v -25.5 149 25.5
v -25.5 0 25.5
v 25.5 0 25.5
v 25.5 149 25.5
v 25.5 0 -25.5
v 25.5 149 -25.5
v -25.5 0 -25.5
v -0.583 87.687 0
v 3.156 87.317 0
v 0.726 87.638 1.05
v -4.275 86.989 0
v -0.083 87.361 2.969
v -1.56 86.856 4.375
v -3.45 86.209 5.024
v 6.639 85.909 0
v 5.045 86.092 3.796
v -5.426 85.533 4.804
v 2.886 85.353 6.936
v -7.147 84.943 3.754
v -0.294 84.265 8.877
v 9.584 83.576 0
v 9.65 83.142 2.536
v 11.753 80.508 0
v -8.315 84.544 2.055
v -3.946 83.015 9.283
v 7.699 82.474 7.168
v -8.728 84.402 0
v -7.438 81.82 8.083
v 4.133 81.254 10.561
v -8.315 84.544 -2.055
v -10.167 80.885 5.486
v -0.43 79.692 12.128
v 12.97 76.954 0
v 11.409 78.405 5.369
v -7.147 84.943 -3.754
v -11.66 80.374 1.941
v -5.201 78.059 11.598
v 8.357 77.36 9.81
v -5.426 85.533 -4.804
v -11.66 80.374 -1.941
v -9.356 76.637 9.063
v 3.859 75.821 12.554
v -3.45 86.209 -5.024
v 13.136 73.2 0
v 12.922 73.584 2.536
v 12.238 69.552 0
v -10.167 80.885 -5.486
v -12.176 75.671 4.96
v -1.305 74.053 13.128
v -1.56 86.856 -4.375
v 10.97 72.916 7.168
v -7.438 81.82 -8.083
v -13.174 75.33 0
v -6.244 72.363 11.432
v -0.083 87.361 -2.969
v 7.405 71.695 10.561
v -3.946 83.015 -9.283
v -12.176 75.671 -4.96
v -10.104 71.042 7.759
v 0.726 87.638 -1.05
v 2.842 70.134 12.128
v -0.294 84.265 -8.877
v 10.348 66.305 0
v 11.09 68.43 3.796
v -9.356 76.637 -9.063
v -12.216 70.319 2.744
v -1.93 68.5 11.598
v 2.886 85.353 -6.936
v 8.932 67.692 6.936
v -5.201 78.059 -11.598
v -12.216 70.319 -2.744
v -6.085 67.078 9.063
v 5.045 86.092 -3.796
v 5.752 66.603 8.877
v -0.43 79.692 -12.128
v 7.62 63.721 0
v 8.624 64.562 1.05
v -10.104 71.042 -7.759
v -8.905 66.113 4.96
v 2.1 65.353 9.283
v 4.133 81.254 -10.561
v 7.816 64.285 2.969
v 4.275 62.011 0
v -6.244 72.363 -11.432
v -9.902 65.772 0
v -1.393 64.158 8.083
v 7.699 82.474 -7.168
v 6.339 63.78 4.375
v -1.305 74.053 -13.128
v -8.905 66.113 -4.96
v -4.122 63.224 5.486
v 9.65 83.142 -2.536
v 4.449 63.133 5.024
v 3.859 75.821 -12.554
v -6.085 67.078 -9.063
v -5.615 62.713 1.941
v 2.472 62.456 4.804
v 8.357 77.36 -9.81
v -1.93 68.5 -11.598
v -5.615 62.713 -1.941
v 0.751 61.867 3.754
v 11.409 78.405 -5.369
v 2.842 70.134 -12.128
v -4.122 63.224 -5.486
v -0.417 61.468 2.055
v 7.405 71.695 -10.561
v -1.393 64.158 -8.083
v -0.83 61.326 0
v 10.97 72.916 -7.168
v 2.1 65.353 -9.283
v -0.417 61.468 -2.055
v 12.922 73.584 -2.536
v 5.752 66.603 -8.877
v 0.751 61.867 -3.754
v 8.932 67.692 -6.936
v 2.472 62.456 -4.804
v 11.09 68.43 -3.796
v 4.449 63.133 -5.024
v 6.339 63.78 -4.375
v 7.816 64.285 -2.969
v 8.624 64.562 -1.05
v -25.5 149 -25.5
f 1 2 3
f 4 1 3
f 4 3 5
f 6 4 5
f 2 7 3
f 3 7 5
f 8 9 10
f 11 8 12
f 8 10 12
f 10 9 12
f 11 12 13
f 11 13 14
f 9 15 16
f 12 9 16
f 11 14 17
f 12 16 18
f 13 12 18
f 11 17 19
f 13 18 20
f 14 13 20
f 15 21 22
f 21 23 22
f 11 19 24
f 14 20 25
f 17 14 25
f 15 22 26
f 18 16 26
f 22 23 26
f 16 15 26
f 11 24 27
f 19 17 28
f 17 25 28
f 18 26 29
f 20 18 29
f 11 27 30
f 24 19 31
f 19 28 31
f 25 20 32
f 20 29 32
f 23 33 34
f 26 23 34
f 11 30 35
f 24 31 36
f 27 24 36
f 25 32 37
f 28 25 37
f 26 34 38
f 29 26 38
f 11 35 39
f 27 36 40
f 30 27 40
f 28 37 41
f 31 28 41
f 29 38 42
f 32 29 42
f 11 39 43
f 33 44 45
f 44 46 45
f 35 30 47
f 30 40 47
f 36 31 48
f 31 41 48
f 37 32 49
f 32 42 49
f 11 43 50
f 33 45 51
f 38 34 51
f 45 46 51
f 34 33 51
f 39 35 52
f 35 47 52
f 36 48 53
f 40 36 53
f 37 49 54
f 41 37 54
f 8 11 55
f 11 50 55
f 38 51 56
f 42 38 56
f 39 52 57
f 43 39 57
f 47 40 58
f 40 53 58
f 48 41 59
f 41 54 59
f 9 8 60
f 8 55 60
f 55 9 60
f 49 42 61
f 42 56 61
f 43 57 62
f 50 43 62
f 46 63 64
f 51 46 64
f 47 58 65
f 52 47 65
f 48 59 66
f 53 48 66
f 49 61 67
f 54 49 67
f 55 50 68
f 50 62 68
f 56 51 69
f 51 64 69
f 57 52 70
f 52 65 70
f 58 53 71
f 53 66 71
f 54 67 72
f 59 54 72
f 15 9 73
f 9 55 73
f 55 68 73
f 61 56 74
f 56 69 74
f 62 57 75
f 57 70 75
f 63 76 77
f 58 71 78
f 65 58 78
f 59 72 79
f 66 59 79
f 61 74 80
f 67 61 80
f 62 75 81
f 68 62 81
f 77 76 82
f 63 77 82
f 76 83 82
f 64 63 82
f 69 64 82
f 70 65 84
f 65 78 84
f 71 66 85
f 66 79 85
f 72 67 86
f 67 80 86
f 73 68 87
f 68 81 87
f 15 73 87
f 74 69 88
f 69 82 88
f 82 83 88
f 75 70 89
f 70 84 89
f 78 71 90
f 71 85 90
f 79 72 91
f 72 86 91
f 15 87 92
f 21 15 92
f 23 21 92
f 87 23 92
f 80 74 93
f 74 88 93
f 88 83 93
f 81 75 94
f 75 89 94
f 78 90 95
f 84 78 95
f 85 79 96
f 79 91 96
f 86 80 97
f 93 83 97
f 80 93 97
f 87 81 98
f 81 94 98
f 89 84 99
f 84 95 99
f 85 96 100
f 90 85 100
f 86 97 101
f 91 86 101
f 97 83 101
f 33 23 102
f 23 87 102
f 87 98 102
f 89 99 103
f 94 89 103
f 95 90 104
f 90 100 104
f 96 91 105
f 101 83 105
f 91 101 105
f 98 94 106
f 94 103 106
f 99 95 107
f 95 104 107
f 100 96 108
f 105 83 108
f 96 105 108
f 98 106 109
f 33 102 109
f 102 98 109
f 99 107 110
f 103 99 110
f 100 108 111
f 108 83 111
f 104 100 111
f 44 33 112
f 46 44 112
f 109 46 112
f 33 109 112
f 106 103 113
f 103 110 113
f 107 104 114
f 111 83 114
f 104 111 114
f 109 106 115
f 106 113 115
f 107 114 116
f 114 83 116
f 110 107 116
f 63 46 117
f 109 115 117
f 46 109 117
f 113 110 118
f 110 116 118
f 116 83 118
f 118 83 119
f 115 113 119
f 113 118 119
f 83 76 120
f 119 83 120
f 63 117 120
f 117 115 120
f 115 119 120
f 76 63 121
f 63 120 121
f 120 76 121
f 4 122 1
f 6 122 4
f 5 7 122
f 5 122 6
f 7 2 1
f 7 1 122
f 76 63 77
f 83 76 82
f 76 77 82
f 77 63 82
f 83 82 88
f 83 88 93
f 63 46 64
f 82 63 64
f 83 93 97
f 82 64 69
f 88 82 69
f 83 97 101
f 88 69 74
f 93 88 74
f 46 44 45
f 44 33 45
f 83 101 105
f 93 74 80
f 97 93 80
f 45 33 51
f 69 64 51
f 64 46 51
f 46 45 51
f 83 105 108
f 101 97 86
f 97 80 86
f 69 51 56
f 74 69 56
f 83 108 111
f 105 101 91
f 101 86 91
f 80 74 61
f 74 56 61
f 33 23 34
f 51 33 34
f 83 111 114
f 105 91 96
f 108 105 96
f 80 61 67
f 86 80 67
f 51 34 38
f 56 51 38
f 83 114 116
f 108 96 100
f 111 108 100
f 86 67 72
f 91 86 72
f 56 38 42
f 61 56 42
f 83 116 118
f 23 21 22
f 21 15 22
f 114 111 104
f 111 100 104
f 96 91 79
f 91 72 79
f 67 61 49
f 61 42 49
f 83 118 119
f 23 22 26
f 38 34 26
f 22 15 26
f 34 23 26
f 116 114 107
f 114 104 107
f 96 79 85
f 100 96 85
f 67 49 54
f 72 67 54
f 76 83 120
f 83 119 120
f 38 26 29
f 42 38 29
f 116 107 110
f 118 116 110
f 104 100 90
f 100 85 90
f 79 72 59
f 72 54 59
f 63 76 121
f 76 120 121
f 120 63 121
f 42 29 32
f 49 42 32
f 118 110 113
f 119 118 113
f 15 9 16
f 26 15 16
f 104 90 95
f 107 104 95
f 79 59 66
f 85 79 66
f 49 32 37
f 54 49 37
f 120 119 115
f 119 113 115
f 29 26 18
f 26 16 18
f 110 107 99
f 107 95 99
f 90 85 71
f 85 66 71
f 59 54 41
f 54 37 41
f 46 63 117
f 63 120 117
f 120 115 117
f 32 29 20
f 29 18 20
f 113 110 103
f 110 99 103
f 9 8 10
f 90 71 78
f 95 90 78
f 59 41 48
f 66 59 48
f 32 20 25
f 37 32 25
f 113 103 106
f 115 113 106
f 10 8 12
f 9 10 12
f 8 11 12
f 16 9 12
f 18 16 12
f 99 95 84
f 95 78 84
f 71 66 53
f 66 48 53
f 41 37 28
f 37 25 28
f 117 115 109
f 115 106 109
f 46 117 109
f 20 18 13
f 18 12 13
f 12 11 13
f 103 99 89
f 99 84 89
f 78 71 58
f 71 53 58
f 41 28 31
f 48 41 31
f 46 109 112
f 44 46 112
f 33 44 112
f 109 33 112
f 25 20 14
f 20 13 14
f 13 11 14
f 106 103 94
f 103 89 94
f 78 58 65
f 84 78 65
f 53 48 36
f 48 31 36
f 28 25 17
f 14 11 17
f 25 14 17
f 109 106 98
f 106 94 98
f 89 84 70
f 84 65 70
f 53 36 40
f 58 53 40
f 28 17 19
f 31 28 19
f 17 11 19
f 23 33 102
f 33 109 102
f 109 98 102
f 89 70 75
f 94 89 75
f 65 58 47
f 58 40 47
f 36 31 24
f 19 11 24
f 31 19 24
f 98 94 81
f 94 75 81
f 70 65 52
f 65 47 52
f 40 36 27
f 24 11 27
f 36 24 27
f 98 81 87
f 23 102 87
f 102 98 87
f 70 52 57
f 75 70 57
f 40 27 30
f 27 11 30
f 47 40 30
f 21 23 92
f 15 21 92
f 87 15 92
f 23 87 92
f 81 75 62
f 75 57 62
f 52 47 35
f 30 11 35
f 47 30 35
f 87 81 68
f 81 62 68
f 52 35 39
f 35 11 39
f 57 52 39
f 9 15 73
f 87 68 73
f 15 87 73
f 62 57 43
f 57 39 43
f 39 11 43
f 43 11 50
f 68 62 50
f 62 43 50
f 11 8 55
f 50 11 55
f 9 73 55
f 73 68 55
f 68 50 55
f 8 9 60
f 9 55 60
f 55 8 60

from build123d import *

# Parameters (mm, degrees)
SKETCH1_W           = 51
SKETCH1_H           = 51
BOSS_EXTRUDE1_DEPTH = 149


with BuildPart() as part:
    # Sketch1 → Boss-Extrude1 (new body)
    with BuildSketch(Plane(origin=(0, 0, 0), x_dir=(1, 0, 0), z_dir=(0, 1, 0))):
        Rectangle(SKETCH1_W, SKETCH1_H)
    extrude(amount=BOSS_EXTRUDE1_DEPTH)

    # Sketch2 → Cut-Revolve1 (revolve, cut)
    with BuildSketch(Plane.XY):
        with BuildLine():
            ThreePointArc((4.274651913, 62.011311077), (12.488688923, 78.774651913), (-4.274651913, 86.988688923))
            Line((-4.274651913, 86.988688923), (4.274651913, 62.011311077))
        make_face()
    revolve(axis=Axis((-25.5, 149, 0), (0.32383726615945974, -0.9461127972109706, 0)), mode=Mode.SUBTRACT)


with BuildPart() as body_2:
    # Sketch2<4> → Revolve2 (revolve)
    with BuildSketch(Plane.XY):
        with BuildLine():
            Line((-4.274651913, 86.988688923), (4.274651913, 62.011311077))
            ThreePointArc((4.274651913, 62.011311077), (12.488688923, 78.774651913), (-4.274651913, 86.988688923))
        make_face()
    revolve(axis=Axis((-25.5, 149, 0), (0.32383726615945974, -0.9461127972109706, 0)))


solid = Compound([part.part, body_2.part])
